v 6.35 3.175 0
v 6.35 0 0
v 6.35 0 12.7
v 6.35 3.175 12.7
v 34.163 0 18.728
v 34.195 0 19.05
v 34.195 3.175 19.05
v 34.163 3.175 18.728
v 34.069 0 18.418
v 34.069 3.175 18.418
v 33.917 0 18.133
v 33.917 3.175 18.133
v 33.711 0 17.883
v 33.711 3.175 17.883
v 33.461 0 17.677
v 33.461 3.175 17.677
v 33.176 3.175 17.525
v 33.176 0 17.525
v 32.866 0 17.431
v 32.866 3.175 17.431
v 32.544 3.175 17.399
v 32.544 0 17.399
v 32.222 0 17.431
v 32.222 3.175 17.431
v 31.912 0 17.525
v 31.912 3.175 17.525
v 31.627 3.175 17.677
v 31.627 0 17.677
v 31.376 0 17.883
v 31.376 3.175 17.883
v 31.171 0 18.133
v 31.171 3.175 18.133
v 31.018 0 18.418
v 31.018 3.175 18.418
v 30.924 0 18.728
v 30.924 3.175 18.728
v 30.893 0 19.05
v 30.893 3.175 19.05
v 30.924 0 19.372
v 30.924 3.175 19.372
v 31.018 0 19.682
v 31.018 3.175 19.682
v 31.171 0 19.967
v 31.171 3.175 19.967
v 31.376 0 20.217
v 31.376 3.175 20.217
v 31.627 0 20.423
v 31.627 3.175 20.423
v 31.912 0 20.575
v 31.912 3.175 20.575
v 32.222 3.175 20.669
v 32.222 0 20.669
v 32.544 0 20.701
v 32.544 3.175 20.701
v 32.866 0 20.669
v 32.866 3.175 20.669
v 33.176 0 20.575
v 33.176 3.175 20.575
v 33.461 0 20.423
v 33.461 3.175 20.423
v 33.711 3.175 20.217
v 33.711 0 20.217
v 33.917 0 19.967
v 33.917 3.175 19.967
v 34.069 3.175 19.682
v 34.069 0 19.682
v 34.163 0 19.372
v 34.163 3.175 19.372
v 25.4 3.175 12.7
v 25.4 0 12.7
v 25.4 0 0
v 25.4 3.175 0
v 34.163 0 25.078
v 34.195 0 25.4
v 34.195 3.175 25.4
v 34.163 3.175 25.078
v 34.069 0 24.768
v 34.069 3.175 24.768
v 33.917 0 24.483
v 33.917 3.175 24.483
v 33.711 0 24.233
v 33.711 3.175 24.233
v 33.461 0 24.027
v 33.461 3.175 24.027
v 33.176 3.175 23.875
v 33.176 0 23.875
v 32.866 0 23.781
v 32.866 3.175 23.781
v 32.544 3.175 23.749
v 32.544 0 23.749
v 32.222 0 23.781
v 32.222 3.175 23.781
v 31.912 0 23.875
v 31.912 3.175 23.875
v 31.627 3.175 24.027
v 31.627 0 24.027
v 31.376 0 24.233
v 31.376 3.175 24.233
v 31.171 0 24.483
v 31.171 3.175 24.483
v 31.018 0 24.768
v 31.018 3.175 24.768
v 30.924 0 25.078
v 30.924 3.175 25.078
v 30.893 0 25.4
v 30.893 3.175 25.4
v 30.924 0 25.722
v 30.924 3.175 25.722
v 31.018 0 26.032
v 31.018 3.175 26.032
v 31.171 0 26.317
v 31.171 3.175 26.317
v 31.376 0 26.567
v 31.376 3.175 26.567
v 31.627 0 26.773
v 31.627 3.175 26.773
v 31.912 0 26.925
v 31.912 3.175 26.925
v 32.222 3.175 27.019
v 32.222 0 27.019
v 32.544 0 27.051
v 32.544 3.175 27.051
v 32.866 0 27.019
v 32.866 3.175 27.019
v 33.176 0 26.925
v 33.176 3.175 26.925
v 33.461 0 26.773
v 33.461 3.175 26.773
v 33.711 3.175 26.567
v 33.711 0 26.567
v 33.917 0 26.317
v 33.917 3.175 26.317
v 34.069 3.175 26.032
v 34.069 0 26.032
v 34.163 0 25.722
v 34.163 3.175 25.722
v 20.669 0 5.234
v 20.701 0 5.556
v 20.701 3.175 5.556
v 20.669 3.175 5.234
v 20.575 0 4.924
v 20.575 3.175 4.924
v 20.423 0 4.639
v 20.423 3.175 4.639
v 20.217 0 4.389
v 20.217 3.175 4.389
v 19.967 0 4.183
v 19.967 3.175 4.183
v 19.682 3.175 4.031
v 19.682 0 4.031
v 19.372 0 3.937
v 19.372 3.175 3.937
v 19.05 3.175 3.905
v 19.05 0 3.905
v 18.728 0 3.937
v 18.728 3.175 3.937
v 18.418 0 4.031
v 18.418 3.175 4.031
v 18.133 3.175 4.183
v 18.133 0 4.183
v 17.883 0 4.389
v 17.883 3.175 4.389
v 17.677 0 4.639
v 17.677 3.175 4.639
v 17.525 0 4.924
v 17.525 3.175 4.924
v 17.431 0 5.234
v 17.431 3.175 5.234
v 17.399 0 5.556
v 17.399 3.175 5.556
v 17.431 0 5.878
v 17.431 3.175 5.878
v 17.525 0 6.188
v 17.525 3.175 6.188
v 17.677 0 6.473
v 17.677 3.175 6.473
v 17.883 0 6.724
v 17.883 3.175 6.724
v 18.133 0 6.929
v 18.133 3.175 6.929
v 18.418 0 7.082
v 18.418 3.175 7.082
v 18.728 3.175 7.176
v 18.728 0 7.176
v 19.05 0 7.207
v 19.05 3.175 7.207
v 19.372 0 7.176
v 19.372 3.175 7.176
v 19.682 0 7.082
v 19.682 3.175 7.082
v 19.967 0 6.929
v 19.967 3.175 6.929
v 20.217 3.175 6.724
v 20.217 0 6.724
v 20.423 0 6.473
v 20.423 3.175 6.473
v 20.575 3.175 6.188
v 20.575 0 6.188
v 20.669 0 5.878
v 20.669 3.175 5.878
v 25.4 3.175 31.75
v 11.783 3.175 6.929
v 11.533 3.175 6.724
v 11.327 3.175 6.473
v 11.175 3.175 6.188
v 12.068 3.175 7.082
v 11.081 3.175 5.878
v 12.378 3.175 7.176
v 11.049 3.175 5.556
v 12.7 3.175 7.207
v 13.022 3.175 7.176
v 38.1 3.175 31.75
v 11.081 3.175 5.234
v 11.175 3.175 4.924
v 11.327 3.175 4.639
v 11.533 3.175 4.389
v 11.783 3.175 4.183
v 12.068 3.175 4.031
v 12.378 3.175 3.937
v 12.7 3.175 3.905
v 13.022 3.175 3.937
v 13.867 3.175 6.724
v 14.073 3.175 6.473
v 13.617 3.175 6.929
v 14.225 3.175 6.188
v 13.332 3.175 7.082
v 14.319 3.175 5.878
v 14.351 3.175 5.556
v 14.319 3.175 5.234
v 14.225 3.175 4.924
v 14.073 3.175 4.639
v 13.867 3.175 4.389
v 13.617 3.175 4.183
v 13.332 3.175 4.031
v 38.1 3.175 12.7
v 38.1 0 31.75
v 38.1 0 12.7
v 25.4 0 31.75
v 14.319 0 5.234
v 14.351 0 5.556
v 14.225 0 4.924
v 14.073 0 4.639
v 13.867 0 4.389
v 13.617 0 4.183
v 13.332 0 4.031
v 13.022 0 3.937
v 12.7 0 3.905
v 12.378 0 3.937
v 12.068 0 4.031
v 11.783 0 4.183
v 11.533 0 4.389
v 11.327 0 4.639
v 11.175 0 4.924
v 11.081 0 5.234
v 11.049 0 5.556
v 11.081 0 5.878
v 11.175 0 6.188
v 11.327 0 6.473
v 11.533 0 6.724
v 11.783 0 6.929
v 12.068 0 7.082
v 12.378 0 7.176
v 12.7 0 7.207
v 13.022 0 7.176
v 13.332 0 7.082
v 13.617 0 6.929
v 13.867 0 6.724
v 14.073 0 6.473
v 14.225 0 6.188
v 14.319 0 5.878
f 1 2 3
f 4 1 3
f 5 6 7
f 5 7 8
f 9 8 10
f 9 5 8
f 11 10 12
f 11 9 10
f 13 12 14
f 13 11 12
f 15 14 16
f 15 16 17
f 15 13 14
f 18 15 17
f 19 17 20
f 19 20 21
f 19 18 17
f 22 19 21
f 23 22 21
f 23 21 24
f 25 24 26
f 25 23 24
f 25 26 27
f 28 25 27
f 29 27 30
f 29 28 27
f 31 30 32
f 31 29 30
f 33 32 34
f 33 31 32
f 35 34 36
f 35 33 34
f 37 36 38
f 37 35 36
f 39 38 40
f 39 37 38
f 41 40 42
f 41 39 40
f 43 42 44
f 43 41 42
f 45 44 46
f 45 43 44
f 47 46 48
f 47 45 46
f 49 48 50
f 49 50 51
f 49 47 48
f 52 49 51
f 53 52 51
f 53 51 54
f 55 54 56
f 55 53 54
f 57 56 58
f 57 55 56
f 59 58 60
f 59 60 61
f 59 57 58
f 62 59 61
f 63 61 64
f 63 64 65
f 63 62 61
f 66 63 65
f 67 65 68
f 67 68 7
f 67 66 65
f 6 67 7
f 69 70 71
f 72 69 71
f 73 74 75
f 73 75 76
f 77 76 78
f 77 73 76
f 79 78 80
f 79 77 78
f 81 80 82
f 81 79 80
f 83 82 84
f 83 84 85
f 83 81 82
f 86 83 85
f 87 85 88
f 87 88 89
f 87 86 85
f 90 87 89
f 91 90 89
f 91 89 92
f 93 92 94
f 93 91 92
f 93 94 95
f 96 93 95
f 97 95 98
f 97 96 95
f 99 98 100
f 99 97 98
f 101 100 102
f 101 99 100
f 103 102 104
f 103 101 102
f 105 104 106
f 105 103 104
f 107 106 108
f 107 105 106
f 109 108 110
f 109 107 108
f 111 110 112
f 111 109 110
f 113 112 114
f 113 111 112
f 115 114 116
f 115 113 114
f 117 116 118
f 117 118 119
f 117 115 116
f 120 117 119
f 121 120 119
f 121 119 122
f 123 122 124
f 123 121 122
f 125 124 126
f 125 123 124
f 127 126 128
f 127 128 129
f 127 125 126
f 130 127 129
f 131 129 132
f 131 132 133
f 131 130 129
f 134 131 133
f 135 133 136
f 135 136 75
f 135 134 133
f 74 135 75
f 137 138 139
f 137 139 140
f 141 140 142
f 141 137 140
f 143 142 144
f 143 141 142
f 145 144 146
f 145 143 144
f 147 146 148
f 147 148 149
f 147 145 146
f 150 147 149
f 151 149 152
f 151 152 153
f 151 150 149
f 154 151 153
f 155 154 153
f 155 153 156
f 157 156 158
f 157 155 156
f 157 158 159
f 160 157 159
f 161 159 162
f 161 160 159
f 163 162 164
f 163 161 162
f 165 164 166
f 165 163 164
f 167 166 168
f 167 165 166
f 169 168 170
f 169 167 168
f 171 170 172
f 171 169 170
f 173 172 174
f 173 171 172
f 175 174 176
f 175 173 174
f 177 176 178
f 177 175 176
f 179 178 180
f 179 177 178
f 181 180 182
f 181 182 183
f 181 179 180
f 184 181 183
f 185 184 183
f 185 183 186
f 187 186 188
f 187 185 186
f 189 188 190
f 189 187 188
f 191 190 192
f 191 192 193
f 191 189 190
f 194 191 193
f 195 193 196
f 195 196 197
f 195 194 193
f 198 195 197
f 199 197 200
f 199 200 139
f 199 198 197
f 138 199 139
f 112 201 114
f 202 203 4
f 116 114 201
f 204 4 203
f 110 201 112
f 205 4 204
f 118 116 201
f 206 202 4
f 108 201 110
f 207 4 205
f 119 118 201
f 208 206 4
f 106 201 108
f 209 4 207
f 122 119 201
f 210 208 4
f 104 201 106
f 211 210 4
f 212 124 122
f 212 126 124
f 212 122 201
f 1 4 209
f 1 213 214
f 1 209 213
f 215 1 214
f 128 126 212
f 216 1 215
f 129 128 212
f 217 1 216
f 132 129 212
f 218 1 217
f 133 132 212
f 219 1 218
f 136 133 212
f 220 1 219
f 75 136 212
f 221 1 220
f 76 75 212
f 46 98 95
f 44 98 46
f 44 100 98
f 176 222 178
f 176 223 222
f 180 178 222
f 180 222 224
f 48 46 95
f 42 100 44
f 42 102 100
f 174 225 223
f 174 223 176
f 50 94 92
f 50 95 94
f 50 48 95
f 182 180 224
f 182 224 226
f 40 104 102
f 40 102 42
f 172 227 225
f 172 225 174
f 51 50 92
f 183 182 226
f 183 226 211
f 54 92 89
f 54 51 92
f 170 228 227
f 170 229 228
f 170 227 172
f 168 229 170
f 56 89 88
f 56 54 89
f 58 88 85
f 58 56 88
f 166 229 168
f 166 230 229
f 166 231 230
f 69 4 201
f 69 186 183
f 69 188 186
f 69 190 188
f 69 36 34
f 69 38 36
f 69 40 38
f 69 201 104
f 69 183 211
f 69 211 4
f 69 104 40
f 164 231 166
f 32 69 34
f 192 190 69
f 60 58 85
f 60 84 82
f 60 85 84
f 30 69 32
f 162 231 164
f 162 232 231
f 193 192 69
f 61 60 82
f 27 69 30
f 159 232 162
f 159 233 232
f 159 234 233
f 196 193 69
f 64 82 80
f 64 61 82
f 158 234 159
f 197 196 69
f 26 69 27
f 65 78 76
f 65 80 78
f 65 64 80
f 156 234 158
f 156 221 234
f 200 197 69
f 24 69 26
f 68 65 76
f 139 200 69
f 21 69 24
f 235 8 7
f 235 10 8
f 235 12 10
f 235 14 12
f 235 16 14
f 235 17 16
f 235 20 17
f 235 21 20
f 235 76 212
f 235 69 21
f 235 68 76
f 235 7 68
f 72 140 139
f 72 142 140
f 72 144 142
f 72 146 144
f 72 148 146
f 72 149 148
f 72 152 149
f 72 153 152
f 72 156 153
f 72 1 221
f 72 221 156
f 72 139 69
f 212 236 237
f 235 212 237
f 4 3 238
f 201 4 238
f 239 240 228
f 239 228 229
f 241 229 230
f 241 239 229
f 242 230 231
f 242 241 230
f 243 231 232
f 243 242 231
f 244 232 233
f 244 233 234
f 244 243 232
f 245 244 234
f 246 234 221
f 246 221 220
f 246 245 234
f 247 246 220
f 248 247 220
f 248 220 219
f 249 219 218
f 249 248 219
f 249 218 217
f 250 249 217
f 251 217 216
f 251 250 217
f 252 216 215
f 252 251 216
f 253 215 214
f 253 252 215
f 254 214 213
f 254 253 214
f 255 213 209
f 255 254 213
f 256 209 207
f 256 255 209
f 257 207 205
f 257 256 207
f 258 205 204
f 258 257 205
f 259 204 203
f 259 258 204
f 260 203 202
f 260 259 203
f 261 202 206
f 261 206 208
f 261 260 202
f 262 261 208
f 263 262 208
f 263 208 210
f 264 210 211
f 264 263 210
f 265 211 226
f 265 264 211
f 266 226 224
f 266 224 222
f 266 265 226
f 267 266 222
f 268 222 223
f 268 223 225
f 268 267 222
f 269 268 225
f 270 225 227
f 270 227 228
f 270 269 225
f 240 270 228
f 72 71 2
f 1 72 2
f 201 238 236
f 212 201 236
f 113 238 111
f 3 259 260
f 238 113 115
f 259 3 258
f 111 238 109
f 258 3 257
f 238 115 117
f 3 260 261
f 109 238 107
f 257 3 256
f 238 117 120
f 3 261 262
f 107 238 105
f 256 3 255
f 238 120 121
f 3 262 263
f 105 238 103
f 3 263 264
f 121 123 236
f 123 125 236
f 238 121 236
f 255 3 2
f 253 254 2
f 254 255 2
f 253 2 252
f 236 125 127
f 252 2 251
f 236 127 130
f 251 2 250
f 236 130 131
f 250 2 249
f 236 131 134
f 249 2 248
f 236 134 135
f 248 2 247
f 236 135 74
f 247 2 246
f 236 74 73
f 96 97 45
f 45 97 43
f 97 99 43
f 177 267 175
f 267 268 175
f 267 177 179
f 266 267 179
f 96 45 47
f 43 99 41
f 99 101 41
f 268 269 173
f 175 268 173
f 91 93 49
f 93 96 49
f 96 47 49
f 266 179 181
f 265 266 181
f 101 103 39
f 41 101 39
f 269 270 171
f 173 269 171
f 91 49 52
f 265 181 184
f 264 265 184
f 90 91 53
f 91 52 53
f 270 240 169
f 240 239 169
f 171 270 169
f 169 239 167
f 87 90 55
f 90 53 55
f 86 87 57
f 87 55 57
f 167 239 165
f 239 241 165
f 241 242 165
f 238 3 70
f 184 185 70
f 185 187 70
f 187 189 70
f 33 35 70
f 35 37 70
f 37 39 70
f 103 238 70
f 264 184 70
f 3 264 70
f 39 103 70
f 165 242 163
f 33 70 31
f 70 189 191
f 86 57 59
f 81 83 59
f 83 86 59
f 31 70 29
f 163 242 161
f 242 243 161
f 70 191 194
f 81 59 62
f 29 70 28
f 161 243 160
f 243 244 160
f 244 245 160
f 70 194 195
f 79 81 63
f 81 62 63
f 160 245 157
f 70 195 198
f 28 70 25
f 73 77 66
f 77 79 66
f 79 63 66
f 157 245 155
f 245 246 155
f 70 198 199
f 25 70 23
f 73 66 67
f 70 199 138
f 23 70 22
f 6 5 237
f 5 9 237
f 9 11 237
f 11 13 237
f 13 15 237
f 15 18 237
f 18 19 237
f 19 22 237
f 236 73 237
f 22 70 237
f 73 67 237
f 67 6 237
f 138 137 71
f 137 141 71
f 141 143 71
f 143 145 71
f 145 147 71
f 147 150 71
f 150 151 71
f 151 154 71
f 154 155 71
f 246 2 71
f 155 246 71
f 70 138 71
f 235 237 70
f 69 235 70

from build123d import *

# Parameters (mm, degrees)
SKETCH1_R           = 1.651
BOSS_EXTRUDE1_DEPTH = 3.175


with BuildPart() as part:
    # Sketch1 → Boss-Extrude1 (new body)
    with BuildSketch(Plane(origin=(0, 0, 0), x_dir=(1, 0, 0), z_dir=(0, 1, 0))):
        Polygon((38.1, -12.7), (25.4, -12.7), (25.4, 0), (6.35, 0), (6.35, -12.7), (25.4, -31.75), (38.1, -31.75), align=None)
        with Locations((32.54375, -19.05)):
            Circle(SKETCH1_R, mode=Mode.SUBTRACT)
        with Locations((32.54375, -25.4)):
            Circle(SKETCH1_R, mode=Mode.SUBTRACT)
        with Locations((12.7, -5.55625)):
            Circle(SKETCH1_R, mode=Mode.SUBTRACT)
        with Locations((19.05, -5.55625)):
            Circle(SKETCH1_R, mode=Mode.SUBTRACT)
    extrude(amount=BOSS_EXTRUDE1_DEPTH)


solid = part.part
